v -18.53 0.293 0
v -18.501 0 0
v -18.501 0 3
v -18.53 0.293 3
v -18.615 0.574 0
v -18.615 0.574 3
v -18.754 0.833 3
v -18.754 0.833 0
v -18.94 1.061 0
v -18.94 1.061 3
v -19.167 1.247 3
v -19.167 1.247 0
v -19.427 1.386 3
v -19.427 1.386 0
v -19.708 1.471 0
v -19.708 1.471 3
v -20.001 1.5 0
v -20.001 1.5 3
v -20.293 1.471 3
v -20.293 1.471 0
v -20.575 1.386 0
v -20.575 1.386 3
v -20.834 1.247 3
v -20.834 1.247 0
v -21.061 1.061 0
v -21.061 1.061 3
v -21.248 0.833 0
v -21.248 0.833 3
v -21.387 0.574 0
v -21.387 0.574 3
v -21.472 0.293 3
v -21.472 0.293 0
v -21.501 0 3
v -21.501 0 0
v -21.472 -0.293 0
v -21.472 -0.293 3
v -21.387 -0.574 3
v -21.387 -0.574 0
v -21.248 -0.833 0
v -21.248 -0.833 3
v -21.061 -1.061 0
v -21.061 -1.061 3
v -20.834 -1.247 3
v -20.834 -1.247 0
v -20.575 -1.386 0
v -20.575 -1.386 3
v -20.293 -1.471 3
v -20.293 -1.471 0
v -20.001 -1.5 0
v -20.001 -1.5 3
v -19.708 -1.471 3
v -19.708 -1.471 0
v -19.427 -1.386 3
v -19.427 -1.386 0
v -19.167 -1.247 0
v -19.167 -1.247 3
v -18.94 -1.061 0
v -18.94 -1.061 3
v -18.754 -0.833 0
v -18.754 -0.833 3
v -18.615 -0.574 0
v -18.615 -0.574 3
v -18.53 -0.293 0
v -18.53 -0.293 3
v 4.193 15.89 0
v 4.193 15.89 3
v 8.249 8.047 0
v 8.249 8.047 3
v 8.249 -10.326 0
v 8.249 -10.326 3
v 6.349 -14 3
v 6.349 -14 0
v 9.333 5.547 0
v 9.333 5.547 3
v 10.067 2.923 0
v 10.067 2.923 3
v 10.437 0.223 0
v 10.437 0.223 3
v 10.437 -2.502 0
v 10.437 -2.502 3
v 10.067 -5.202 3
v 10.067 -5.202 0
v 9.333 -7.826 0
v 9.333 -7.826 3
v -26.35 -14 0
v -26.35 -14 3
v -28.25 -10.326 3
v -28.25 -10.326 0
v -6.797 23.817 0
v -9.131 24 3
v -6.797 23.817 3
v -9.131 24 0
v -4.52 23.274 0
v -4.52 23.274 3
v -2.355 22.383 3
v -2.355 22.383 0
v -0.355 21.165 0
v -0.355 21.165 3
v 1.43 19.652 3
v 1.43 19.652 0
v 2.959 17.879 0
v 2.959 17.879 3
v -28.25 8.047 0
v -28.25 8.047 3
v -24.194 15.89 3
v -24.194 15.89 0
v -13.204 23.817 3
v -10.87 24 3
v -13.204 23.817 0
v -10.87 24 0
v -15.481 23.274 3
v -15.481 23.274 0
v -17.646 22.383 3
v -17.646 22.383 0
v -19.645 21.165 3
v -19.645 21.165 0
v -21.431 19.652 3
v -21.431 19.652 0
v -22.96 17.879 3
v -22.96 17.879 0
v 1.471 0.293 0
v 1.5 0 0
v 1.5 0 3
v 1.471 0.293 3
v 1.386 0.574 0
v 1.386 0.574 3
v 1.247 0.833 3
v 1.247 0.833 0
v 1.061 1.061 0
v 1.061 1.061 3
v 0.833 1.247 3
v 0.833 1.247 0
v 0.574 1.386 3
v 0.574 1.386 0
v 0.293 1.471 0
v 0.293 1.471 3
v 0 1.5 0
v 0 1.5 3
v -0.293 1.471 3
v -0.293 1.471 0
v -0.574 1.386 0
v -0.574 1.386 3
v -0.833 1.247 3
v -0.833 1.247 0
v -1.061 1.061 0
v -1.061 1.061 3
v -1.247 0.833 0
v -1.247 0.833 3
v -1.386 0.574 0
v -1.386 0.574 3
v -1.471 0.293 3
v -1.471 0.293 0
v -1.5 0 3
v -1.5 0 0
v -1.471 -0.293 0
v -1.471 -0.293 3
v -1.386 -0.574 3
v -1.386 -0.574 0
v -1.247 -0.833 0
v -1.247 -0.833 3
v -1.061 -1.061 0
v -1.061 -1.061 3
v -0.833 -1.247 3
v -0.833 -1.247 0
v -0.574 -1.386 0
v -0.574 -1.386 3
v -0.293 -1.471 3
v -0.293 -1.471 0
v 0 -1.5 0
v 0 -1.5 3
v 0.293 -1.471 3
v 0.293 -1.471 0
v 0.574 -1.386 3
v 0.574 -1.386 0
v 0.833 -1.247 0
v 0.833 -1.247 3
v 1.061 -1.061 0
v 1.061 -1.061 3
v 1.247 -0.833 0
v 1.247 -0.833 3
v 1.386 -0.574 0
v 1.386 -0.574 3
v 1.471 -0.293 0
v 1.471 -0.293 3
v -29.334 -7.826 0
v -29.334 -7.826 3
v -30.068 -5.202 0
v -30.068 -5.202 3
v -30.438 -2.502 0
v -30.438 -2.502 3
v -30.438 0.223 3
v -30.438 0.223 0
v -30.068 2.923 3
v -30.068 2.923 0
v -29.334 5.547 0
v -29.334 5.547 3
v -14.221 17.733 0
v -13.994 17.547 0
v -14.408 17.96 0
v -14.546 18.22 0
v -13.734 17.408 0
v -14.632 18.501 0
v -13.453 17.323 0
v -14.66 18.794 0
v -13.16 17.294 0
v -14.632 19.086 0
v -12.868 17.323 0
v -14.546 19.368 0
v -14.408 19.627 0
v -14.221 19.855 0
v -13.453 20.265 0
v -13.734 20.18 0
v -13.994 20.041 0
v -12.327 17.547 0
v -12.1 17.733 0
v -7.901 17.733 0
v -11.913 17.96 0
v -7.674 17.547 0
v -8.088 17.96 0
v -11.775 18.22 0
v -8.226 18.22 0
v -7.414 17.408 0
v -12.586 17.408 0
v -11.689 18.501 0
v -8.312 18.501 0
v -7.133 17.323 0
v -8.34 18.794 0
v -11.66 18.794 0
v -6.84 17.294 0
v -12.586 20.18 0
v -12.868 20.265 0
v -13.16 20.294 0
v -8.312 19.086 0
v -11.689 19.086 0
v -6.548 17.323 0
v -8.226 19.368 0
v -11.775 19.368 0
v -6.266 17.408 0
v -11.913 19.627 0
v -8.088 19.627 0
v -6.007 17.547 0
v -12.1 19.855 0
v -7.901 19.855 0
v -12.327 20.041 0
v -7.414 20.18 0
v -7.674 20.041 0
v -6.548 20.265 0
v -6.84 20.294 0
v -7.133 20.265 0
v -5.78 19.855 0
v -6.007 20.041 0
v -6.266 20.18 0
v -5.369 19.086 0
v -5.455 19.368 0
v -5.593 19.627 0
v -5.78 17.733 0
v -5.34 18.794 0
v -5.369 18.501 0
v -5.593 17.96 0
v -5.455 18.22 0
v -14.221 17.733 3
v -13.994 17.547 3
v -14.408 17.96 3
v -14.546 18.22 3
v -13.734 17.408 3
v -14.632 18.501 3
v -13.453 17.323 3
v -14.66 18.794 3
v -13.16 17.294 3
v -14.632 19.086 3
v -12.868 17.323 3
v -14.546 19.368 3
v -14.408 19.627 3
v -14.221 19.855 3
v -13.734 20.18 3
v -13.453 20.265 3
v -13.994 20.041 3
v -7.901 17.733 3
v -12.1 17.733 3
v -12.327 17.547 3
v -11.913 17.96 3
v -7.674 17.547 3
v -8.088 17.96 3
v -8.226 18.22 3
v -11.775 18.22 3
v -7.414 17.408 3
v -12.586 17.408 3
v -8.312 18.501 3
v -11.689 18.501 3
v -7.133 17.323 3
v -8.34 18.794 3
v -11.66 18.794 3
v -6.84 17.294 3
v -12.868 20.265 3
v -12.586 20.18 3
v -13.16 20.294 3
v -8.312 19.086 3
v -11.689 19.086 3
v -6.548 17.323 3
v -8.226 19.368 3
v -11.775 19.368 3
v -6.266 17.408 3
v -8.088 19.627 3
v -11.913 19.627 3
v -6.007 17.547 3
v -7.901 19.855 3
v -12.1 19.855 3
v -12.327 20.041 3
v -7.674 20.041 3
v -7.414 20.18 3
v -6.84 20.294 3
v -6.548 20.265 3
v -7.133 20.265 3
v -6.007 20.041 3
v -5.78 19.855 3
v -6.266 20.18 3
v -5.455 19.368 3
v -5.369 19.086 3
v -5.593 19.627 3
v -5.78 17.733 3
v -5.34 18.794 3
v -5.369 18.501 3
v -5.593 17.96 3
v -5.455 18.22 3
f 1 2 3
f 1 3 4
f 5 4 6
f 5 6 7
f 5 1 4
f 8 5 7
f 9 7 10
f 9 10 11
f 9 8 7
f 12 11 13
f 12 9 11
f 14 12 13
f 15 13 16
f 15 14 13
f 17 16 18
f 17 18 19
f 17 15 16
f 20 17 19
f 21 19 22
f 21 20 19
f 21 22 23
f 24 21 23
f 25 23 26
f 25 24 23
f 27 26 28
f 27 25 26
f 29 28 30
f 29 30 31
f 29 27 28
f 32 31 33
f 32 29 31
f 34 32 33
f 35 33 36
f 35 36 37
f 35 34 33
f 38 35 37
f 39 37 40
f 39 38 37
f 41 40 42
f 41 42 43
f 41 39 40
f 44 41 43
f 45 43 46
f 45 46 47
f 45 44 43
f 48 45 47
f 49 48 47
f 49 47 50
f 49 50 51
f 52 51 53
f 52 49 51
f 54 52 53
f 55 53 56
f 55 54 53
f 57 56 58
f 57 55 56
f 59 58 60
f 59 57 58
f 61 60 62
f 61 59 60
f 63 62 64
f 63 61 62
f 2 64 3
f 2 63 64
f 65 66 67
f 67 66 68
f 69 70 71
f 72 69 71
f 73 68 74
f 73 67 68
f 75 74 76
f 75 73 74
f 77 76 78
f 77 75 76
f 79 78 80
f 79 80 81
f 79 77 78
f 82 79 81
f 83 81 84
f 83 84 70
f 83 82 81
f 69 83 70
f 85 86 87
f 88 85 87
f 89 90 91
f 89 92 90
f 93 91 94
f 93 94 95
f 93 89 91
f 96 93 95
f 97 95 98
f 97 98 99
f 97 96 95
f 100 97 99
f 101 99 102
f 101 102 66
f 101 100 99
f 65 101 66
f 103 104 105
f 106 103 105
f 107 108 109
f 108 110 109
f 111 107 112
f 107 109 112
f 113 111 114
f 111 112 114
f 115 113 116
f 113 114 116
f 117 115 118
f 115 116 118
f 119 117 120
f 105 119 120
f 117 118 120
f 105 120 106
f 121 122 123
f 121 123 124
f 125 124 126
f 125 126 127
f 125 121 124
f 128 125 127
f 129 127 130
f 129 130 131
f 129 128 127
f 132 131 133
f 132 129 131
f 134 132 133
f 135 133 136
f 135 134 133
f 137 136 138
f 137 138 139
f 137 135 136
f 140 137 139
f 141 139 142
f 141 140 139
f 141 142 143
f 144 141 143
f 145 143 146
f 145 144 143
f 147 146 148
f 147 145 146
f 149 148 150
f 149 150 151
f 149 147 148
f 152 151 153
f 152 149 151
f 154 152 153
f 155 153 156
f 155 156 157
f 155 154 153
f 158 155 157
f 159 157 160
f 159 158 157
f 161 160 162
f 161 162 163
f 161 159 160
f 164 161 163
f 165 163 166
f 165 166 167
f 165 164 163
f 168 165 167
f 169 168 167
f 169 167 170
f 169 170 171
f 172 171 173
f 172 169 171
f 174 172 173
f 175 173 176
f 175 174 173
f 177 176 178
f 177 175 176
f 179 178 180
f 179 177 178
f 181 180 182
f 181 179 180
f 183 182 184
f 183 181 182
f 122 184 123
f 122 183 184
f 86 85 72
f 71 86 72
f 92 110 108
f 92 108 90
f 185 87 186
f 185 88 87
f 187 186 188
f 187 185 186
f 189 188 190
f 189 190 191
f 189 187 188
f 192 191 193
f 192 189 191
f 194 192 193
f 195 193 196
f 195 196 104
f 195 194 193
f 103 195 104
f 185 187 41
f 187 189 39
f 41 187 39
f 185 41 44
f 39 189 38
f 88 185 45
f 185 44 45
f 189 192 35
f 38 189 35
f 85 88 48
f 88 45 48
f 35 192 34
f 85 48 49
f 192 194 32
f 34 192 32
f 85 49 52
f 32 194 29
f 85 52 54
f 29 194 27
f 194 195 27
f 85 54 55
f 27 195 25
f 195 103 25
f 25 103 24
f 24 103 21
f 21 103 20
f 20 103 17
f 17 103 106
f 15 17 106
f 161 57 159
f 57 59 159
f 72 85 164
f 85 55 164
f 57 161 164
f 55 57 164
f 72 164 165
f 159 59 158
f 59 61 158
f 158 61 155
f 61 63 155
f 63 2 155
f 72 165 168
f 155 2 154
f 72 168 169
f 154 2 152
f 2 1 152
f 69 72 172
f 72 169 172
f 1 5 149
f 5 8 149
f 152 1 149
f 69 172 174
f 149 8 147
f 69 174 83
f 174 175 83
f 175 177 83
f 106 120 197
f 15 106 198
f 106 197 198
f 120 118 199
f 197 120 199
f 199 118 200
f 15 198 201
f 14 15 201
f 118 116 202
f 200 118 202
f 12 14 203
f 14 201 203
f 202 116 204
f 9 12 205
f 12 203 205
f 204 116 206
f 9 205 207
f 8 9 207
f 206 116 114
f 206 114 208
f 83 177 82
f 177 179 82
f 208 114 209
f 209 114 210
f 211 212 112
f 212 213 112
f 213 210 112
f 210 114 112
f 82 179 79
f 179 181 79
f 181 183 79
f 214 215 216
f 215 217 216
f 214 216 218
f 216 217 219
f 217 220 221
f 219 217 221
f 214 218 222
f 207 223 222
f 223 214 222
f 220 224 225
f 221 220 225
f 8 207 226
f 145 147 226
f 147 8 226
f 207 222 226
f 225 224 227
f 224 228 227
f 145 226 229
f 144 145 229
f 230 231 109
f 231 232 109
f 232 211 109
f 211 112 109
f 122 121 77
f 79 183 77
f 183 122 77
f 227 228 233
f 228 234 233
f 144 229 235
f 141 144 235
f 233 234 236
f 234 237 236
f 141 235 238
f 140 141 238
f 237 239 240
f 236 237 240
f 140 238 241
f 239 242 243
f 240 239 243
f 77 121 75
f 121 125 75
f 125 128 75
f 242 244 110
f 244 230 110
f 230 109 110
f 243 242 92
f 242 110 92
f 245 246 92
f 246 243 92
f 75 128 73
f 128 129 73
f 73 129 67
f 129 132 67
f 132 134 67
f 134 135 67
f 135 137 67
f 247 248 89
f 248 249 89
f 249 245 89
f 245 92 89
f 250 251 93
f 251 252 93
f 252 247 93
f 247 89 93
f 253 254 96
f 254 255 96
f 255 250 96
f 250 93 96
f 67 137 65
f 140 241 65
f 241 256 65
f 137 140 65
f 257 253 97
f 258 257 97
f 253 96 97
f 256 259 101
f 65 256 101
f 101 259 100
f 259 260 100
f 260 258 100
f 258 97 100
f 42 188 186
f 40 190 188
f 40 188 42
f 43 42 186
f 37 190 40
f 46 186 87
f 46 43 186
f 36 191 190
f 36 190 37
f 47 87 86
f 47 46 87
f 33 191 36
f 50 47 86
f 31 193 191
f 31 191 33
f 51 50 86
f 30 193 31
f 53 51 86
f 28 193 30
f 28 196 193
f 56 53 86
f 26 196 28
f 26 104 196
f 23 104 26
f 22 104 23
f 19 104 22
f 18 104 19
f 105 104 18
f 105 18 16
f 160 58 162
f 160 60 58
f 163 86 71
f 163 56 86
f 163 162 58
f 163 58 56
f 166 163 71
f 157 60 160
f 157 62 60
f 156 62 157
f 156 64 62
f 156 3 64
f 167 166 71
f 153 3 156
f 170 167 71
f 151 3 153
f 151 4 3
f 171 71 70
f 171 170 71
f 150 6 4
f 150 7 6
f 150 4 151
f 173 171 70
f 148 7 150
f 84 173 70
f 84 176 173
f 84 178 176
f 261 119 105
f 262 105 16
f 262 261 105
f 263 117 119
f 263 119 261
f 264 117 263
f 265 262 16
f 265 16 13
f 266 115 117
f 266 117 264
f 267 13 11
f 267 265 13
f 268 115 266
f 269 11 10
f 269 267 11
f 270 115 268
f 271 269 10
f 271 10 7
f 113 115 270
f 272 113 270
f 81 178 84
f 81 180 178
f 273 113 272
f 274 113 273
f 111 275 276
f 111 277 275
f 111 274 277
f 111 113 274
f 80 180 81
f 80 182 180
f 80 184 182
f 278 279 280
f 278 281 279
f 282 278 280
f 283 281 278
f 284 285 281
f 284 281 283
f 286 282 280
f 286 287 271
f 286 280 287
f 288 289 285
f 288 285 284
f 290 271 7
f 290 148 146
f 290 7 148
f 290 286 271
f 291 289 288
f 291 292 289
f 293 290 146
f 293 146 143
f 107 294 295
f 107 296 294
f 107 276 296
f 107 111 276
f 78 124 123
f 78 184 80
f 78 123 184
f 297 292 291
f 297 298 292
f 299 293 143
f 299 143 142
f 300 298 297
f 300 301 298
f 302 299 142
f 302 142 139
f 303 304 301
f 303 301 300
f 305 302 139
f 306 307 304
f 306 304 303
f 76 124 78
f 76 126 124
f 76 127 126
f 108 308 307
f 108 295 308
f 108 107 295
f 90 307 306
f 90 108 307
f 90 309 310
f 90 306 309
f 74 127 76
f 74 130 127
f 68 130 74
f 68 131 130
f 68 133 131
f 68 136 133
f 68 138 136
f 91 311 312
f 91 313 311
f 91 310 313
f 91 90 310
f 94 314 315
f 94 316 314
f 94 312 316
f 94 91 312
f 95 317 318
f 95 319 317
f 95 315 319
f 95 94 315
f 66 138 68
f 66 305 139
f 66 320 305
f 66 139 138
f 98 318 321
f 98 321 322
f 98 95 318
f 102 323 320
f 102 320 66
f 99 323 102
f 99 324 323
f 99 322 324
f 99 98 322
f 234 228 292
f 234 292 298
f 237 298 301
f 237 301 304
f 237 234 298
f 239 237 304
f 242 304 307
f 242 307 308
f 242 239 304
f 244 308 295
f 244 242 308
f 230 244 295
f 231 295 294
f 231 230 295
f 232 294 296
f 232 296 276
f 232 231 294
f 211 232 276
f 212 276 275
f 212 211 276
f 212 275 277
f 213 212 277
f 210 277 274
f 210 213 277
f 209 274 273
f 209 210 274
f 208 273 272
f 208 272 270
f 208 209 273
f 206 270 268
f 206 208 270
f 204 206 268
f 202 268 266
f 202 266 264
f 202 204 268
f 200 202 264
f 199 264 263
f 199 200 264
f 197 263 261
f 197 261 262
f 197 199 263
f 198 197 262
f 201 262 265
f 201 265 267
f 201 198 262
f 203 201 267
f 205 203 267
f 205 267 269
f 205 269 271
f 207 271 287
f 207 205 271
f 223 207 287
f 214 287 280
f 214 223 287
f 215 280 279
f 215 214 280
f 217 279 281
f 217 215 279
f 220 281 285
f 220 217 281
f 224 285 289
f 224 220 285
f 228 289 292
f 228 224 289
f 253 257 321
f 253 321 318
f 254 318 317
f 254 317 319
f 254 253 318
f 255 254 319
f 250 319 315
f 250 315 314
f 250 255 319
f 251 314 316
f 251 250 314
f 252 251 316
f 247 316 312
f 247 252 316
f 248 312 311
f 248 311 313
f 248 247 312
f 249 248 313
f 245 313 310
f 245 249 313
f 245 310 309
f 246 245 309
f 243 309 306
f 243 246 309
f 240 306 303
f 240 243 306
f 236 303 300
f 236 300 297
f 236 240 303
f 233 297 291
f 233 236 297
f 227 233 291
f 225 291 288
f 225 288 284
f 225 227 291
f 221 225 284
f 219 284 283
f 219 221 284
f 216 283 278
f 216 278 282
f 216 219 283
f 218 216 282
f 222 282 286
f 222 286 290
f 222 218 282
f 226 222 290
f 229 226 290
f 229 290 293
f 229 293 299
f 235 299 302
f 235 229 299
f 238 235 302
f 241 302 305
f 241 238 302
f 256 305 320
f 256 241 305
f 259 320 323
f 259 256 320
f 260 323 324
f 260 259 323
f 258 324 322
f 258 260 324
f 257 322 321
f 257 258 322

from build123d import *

# Parameters (mm, degrees)
SCHIZZO1_W                   = 46
SCHIZZO1_H                   = 38
SCHIZZO1_R                   = 1.5
ESTRUSIONE_ESTRUSIONE3_DEPTH = 3
TAGLIO_ESTRUSIONE1_DEPTH     = 3
RACCORDO1_R                  = 15
RACCORDO2_R                  = 15
RACCORDO3_R                  = 20
RACCORDO4_R                  = 20


with BuildPart() as part:
    # Schizzo1 → Estrusione-Estrusione3 (new body)
    with BuildSketch(Plane.XY):
        with Locations((-10.000402867, 5)):
            Rectangle(SCHIZZO1_W, SCHIZZO1_H)
        with Locations((-6.840402867, 18.793852416)):
            Circle(SCHIZZO1_R, mode=Mode.SUBTRACT)
        Circle(SCHIZZO1_R, mode=Mode.SUBTRACT)
        with Locations((-20.000805733, 0)):
            Circle(SCHIZZO1_R, mode=Mode.SUBTRACT)
        with Locations((-13.160402867, 18.793852416)):
            Circle(SCHIZZO1_R, mode=Mode.SUBTRACT)
    extrude(amount=ESTRUSIONE_ESTRUSIONE3_DEPTH)

    # Schizzo4 → Taglio-Estrusione1 (cut)
    with BuildSketch(Plane.XY.offset(3)):
        Polygon((-33.000402867, -1.13961018), (-20.000402867, 24), (-33.000402867, 24), align=None)
        Polygon((12.999597133, 24), (-0.000402867, 24), (12.999597133, -1.13961018), align=None)
        Polygon((-26.350137947, -14), (-33.000402867, -1.13961018), (-33.000402867, -14), align=None)
        Polygon((12.999597133, -14), (12.999597133, -1.13961018), (6.349332214, -14), align=None)
    extrude(amount=-TAGLIO_ESTRUSIONE1_DEPTH, mode=Mode.SUBTRACT)

    # Raccordo1
    raccordo1_edges = [part.edges().sort_by_distance(p)[0] for p in [
        (-0.000402867, 24, 1.5),
    ]]
    fillet(raccordo1_edges, radius=RACCORDO1_R)

    # Raccordo2
    raccordo2_edges = [part.edges().sort_by_distance(p)[0] for p in [
        (-20.000402867, 24, 1.5),
    ]]
    fillet(raccordo2_edges, radius=RACCORDO2_R)

    # Raccordo3
    raccordo3_edges = [part.edges().sort_by_distance(p)[0] for p in [
        (12.999597133, -1.13961018, 1.5),
    ]]
    fillet(raccordo3_edges, radius=RACCORDO3_R)

    # Raccordo4
    raccordo4_edges = [part.edges().sort_by_distance(p)[0] for p in [
        (-33.000402867, -1.13961018, 1.5),
    ]]
    fillet(raccordo4_edges, radius=RACCORDO4_R)


solid = part.part
